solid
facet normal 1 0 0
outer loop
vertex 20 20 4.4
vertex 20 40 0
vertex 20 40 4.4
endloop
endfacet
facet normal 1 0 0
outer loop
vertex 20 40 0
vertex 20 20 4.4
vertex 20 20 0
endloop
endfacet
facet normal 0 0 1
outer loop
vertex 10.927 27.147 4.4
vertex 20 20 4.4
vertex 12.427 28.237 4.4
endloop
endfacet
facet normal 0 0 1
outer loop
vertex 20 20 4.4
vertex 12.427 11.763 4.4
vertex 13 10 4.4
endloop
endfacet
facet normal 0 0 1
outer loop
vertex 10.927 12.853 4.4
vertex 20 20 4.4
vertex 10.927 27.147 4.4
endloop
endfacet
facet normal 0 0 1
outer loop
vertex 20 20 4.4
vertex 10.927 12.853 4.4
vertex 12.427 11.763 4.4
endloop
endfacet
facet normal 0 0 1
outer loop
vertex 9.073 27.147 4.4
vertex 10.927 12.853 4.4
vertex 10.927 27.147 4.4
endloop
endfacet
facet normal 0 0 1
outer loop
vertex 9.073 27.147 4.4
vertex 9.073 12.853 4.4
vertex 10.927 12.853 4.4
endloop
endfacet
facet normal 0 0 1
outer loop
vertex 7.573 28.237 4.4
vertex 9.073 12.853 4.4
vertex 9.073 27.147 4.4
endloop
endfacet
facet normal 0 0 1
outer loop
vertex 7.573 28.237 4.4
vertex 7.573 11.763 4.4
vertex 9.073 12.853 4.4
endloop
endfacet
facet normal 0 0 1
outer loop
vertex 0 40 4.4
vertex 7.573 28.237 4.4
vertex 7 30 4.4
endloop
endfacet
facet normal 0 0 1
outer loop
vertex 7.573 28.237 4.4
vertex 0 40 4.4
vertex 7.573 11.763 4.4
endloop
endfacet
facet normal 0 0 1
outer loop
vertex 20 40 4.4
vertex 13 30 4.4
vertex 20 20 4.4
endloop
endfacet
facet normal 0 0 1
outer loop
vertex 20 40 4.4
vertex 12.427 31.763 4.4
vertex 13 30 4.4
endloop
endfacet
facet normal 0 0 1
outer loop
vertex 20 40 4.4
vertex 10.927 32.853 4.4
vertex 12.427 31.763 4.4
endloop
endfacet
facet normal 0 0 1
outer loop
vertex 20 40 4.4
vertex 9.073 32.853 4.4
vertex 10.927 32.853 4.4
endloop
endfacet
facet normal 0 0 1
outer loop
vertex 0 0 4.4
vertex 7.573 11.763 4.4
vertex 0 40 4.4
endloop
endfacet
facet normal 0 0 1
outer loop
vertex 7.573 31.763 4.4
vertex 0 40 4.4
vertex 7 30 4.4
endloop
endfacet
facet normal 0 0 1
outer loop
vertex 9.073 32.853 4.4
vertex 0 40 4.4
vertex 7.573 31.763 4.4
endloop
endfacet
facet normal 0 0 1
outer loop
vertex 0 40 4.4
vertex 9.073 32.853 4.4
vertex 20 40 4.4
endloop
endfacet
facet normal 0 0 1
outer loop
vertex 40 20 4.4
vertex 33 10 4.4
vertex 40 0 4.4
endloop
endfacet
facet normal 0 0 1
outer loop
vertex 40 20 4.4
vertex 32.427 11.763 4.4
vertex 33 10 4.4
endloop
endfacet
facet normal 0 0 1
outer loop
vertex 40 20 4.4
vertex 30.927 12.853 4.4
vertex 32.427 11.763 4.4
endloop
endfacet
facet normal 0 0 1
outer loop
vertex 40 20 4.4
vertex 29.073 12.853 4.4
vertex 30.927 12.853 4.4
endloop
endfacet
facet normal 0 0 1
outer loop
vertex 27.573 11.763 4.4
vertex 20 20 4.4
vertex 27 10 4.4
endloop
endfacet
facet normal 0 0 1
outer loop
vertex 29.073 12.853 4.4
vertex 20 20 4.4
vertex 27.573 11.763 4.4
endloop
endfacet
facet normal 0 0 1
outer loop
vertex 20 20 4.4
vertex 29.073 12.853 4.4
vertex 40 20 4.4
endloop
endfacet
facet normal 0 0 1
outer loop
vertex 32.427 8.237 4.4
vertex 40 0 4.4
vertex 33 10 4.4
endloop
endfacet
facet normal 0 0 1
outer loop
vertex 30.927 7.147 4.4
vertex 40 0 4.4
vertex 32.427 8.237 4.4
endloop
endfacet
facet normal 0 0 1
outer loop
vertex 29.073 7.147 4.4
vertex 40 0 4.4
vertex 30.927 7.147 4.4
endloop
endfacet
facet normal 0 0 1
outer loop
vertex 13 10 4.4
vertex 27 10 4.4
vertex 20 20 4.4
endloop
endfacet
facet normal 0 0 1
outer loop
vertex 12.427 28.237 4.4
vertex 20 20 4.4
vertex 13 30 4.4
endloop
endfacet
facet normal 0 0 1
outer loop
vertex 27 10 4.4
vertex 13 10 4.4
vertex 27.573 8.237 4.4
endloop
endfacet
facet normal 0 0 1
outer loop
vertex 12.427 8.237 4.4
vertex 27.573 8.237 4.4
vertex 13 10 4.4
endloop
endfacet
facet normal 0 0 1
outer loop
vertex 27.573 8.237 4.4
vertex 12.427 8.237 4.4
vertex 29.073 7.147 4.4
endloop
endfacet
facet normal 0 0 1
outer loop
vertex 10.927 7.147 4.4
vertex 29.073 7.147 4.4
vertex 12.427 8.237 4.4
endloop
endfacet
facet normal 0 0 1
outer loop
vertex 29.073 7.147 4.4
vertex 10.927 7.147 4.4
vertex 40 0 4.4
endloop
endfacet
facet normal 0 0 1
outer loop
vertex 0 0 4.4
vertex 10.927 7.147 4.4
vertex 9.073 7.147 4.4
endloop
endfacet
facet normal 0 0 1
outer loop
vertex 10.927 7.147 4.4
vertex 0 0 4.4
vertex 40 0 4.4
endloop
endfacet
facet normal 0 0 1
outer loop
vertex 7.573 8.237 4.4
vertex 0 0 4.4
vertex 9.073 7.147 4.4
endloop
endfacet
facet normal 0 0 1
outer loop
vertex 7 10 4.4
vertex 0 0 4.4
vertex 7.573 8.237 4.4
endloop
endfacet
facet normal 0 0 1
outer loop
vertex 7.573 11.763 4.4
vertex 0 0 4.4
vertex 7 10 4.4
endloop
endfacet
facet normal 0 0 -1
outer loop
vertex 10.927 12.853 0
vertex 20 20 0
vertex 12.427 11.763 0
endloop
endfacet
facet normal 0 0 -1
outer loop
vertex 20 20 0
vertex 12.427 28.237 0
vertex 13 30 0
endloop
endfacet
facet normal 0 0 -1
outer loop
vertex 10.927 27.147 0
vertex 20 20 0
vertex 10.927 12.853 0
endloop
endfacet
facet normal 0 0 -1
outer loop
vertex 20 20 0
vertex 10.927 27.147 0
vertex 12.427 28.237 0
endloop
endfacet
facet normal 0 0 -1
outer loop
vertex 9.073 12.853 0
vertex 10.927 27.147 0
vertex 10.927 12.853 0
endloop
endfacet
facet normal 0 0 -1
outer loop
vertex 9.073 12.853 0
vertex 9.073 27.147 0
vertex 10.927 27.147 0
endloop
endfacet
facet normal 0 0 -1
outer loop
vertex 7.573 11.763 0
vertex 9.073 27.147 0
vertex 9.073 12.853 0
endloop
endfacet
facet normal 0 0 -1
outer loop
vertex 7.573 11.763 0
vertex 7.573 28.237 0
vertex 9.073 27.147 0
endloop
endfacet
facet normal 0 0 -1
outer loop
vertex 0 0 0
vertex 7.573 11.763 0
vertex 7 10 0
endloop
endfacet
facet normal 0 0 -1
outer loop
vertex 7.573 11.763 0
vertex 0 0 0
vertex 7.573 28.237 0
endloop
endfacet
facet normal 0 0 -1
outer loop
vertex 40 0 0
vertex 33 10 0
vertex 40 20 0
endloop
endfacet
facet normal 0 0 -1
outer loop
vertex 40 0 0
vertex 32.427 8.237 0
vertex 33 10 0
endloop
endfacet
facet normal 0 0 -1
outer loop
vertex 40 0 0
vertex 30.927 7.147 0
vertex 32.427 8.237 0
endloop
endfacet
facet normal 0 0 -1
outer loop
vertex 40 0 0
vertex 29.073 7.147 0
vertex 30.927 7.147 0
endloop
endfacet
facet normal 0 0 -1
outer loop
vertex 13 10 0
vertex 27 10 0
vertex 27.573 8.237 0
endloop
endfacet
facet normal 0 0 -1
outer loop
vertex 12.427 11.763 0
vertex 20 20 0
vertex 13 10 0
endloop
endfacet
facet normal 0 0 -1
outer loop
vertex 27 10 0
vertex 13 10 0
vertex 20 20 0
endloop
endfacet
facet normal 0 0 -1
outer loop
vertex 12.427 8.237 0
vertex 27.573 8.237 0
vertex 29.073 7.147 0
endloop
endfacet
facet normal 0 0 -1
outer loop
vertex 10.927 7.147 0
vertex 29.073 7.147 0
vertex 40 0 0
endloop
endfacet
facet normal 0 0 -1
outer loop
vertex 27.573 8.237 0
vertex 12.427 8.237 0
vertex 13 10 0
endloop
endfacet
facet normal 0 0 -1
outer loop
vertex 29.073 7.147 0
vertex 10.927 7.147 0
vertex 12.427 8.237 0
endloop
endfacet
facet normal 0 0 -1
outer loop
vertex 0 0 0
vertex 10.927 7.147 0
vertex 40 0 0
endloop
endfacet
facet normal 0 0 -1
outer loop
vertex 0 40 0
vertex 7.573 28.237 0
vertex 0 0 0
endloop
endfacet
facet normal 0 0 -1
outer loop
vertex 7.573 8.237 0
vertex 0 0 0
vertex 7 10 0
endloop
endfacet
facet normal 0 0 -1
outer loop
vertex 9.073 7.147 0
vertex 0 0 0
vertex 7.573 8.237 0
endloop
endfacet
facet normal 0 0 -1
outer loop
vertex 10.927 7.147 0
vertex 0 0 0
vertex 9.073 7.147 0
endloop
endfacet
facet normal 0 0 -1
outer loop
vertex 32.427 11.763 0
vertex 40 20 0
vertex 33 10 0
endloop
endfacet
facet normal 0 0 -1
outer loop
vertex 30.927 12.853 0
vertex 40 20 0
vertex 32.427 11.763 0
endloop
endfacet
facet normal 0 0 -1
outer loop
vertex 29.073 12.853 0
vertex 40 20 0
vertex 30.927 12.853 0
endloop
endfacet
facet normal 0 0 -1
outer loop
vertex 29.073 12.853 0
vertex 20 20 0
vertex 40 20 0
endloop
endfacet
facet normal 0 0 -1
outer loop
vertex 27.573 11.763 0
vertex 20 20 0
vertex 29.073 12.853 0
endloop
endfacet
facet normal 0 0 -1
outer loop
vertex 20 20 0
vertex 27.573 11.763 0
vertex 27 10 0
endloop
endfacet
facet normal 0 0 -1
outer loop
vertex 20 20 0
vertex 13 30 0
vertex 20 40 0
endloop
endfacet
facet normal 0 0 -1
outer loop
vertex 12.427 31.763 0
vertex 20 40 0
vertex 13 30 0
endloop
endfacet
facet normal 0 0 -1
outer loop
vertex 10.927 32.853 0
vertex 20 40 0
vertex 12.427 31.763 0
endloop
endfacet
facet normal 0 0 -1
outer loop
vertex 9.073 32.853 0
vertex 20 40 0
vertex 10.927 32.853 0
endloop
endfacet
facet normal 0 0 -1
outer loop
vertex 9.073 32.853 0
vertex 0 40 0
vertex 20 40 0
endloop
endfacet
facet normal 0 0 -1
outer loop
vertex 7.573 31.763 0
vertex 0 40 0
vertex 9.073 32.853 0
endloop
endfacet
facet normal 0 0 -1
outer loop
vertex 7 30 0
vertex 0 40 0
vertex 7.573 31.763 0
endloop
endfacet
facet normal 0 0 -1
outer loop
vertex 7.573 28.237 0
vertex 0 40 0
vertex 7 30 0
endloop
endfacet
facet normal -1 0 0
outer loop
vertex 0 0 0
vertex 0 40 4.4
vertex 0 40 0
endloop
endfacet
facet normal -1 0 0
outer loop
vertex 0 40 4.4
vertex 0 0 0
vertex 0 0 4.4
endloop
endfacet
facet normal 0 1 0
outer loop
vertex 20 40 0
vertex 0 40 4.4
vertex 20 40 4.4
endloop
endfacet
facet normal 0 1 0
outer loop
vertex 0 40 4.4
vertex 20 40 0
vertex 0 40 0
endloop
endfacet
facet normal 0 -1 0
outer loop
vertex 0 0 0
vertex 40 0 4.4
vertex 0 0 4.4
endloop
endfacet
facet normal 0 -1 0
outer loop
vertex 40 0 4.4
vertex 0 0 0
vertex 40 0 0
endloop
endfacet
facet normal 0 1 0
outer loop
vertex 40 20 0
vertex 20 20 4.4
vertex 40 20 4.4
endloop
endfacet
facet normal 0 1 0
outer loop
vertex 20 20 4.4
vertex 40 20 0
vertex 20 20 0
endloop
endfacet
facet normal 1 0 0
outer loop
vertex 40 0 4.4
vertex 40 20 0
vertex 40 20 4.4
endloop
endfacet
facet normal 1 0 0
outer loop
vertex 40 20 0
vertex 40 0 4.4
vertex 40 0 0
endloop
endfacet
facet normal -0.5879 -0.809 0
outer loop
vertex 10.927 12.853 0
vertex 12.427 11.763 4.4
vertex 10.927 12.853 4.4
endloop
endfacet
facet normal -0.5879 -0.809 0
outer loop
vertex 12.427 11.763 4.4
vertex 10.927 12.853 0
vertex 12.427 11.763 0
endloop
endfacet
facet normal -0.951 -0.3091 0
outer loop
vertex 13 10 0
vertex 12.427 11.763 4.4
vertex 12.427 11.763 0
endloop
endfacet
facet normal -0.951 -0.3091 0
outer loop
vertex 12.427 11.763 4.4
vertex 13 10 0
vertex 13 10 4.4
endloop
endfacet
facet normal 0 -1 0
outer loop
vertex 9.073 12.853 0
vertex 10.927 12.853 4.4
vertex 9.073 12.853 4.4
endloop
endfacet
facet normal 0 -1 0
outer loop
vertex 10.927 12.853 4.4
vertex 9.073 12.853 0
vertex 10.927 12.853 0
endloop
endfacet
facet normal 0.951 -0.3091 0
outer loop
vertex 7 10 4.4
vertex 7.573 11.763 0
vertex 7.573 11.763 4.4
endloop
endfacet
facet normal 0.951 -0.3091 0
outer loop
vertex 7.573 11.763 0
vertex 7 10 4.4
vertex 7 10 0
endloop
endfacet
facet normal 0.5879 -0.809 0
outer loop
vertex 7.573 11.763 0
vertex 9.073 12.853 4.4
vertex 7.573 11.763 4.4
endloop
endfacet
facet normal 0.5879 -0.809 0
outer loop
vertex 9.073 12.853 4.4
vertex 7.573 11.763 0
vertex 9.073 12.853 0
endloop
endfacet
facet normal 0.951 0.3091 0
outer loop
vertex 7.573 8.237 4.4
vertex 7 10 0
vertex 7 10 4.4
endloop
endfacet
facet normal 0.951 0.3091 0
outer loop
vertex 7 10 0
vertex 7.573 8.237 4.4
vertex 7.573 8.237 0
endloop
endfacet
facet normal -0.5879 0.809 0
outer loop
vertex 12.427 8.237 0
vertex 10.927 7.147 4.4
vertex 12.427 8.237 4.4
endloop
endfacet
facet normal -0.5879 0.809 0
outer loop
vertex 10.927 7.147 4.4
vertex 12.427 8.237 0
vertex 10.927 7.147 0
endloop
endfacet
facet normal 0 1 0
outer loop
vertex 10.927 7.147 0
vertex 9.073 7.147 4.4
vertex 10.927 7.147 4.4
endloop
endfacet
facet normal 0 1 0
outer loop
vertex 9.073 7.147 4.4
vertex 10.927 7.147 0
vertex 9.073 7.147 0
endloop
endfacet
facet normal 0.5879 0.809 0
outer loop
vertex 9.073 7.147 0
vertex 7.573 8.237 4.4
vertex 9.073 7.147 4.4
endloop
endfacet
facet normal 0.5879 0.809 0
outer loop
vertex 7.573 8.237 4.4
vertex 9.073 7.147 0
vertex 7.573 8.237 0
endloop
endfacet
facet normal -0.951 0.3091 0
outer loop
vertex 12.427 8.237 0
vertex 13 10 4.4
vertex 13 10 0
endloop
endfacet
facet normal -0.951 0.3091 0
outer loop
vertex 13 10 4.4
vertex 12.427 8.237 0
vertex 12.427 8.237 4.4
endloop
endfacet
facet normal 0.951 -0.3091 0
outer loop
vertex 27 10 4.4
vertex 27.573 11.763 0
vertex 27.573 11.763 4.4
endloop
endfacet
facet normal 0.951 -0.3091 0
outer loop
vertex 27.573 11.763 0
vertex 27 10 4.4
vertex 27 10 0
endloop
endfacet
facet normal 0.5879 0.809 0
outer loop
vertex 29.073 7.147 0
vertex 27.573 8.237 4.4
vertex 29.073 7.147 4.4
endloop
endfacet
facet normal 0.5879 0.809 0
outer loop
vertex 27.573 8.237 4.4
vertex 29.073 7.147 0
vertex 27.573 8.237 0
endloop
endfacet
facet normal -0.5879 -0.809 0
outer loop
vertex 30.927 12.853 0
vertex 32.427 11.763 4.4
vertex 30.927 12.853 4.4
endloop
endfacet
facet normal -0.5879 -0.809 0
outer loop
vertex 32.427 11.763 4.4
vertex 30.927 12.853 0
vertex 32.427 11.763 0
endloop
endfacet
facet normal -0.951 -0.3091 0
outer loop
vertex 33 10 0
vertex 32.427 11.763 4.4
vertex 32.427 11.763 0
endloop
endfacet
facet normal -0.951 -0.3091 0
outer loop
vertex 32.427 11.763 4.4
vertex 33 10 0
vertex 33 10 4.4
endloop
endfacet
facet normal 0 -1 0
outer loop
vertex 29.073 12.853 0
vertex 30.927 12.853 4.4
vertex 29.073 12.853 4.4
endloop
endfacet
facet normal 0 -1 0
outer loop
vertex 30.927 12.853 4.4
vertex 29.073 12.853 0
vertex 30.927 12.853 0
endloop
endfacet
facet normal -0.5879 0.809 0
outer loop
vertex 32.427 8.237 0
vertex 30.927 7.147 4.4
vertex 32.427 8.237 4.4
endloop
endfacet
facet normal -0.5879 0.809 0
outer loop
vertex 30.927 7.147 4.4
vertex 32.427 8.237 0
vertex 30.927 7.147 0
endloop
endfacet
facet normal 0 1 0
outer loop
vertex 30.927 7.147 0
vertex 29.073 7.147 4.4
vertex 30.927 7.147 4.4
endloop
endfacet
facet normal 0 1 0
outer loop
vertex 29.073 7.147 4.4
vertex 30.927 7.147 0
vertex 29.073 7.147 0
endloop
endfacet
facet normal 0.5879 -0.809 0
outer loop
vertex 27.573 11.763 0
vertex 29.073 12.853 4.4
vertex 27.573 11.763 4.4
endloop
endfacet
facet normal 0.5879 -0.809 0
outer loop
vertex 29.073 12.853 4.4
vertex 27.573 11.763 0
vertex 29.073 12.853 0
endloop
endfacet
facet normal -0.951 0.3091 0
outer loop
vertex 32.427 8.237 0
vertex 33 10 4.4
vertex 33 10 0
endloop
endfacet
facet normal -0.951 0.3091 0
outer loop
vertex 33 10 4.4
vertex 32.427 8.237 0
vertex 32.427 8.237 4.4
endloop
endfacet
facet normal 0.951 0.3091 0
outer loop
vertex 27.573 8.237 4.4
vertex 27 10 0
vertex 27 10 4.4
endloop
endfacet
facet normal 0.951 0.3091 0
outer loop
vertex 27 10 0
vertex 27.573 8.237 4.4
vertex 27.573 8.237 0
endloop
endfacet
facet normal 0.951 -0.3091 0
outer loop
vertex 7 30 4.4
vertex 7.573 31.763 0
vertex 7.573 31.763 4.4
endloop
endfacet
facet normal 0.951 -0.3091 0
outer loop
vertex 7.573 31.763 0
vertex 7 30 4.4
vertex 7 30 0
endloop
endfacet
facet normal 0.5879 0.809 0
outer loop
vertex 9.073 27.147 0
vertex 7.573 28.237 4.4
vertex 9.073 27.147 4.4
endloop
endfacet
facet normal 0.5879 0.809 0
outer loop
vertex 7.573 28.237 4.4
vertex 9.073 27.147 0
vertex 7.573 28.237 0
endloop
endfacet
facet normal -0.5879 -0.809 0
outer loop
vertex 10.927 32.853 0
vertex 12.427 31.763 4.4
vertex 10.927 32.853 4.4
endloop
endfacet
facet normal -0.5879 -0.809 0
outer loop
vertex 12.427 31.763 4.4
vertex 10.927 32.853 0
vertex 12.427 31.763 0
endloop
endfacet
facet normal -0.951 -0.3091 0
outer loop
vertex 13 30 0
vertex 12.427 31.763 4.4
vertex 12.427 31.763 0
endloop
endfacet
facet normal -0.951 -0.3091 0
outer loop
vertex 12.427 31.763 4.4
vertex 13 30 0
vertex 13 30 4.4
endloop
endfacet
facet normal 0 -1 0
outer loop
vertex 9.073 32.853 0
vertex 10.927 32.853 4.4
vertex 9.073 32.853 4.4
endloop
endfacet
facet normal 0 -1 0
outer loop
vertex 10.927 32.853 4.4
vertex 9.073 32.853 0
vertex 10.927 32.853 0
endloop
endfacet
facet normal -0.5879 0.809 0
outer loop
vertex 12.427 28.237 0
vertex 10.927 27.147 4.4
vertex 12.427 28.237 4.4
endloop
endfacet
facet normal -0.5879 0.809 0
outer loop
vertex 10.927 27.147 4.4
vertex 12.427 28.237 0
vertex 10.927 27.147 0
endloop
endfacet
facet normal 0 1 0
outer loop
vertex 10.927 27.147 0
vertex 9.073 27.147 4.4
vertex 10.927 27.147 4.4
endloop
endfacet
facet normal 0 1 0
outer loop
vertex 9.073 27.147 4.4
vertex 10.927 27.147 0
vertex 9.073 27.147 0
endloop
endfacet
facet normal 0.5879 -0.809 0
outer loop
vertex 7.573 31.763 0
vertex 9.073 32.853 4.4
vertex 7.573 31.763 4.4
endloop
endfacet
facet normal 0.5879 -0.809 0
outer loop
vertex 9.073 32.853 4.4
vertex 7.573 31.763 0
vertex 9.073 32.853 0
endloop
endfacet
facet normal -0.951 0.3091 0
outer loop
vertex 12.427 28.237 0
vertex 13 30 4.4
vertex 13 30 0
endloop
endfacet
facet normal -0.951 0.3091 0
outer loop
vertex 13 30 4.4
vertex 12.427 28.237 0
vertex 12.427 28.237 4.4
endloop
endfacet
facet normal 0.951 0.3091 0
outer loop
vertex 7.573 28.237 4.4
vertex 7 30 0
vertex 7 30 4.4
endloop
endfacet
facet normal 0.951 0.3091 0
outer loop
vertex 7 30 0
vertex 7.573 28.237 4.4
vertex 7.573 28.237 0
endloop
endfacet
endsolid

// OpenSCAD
// Pour Extrusion 2020
// M5*10mm + T-nuts


height = 4.4;
width = 20;
lenght = 40; // 3 hole : 40, 5 hole : 60
tolerance = 1;
screw_d = 5+tolerance;

difference(){
    union(){
        cube([width,lenght,height]);
        rotate([0,0,270]) translate([-width,0,0]) cube([width,lenght,height]);
    }
    union(){
        translate([width/2,width/2,-height]) cylinder(3*height,d=screw_d,true);
        translate([3*width/2,width/2,-height]) cylinder(3*height,d=screw_d,true);
        //translate([5*width/2,width/2,-height]) cylinder(3*height,d=screw_d,true);
        translate([width/2,3*width/2,-height]) cylinder(3*height,d=screw_d,true);
        //translate([width/2,5*width/2,-height]) cylinder(3*height,d=screw_d,true);
    }
}
